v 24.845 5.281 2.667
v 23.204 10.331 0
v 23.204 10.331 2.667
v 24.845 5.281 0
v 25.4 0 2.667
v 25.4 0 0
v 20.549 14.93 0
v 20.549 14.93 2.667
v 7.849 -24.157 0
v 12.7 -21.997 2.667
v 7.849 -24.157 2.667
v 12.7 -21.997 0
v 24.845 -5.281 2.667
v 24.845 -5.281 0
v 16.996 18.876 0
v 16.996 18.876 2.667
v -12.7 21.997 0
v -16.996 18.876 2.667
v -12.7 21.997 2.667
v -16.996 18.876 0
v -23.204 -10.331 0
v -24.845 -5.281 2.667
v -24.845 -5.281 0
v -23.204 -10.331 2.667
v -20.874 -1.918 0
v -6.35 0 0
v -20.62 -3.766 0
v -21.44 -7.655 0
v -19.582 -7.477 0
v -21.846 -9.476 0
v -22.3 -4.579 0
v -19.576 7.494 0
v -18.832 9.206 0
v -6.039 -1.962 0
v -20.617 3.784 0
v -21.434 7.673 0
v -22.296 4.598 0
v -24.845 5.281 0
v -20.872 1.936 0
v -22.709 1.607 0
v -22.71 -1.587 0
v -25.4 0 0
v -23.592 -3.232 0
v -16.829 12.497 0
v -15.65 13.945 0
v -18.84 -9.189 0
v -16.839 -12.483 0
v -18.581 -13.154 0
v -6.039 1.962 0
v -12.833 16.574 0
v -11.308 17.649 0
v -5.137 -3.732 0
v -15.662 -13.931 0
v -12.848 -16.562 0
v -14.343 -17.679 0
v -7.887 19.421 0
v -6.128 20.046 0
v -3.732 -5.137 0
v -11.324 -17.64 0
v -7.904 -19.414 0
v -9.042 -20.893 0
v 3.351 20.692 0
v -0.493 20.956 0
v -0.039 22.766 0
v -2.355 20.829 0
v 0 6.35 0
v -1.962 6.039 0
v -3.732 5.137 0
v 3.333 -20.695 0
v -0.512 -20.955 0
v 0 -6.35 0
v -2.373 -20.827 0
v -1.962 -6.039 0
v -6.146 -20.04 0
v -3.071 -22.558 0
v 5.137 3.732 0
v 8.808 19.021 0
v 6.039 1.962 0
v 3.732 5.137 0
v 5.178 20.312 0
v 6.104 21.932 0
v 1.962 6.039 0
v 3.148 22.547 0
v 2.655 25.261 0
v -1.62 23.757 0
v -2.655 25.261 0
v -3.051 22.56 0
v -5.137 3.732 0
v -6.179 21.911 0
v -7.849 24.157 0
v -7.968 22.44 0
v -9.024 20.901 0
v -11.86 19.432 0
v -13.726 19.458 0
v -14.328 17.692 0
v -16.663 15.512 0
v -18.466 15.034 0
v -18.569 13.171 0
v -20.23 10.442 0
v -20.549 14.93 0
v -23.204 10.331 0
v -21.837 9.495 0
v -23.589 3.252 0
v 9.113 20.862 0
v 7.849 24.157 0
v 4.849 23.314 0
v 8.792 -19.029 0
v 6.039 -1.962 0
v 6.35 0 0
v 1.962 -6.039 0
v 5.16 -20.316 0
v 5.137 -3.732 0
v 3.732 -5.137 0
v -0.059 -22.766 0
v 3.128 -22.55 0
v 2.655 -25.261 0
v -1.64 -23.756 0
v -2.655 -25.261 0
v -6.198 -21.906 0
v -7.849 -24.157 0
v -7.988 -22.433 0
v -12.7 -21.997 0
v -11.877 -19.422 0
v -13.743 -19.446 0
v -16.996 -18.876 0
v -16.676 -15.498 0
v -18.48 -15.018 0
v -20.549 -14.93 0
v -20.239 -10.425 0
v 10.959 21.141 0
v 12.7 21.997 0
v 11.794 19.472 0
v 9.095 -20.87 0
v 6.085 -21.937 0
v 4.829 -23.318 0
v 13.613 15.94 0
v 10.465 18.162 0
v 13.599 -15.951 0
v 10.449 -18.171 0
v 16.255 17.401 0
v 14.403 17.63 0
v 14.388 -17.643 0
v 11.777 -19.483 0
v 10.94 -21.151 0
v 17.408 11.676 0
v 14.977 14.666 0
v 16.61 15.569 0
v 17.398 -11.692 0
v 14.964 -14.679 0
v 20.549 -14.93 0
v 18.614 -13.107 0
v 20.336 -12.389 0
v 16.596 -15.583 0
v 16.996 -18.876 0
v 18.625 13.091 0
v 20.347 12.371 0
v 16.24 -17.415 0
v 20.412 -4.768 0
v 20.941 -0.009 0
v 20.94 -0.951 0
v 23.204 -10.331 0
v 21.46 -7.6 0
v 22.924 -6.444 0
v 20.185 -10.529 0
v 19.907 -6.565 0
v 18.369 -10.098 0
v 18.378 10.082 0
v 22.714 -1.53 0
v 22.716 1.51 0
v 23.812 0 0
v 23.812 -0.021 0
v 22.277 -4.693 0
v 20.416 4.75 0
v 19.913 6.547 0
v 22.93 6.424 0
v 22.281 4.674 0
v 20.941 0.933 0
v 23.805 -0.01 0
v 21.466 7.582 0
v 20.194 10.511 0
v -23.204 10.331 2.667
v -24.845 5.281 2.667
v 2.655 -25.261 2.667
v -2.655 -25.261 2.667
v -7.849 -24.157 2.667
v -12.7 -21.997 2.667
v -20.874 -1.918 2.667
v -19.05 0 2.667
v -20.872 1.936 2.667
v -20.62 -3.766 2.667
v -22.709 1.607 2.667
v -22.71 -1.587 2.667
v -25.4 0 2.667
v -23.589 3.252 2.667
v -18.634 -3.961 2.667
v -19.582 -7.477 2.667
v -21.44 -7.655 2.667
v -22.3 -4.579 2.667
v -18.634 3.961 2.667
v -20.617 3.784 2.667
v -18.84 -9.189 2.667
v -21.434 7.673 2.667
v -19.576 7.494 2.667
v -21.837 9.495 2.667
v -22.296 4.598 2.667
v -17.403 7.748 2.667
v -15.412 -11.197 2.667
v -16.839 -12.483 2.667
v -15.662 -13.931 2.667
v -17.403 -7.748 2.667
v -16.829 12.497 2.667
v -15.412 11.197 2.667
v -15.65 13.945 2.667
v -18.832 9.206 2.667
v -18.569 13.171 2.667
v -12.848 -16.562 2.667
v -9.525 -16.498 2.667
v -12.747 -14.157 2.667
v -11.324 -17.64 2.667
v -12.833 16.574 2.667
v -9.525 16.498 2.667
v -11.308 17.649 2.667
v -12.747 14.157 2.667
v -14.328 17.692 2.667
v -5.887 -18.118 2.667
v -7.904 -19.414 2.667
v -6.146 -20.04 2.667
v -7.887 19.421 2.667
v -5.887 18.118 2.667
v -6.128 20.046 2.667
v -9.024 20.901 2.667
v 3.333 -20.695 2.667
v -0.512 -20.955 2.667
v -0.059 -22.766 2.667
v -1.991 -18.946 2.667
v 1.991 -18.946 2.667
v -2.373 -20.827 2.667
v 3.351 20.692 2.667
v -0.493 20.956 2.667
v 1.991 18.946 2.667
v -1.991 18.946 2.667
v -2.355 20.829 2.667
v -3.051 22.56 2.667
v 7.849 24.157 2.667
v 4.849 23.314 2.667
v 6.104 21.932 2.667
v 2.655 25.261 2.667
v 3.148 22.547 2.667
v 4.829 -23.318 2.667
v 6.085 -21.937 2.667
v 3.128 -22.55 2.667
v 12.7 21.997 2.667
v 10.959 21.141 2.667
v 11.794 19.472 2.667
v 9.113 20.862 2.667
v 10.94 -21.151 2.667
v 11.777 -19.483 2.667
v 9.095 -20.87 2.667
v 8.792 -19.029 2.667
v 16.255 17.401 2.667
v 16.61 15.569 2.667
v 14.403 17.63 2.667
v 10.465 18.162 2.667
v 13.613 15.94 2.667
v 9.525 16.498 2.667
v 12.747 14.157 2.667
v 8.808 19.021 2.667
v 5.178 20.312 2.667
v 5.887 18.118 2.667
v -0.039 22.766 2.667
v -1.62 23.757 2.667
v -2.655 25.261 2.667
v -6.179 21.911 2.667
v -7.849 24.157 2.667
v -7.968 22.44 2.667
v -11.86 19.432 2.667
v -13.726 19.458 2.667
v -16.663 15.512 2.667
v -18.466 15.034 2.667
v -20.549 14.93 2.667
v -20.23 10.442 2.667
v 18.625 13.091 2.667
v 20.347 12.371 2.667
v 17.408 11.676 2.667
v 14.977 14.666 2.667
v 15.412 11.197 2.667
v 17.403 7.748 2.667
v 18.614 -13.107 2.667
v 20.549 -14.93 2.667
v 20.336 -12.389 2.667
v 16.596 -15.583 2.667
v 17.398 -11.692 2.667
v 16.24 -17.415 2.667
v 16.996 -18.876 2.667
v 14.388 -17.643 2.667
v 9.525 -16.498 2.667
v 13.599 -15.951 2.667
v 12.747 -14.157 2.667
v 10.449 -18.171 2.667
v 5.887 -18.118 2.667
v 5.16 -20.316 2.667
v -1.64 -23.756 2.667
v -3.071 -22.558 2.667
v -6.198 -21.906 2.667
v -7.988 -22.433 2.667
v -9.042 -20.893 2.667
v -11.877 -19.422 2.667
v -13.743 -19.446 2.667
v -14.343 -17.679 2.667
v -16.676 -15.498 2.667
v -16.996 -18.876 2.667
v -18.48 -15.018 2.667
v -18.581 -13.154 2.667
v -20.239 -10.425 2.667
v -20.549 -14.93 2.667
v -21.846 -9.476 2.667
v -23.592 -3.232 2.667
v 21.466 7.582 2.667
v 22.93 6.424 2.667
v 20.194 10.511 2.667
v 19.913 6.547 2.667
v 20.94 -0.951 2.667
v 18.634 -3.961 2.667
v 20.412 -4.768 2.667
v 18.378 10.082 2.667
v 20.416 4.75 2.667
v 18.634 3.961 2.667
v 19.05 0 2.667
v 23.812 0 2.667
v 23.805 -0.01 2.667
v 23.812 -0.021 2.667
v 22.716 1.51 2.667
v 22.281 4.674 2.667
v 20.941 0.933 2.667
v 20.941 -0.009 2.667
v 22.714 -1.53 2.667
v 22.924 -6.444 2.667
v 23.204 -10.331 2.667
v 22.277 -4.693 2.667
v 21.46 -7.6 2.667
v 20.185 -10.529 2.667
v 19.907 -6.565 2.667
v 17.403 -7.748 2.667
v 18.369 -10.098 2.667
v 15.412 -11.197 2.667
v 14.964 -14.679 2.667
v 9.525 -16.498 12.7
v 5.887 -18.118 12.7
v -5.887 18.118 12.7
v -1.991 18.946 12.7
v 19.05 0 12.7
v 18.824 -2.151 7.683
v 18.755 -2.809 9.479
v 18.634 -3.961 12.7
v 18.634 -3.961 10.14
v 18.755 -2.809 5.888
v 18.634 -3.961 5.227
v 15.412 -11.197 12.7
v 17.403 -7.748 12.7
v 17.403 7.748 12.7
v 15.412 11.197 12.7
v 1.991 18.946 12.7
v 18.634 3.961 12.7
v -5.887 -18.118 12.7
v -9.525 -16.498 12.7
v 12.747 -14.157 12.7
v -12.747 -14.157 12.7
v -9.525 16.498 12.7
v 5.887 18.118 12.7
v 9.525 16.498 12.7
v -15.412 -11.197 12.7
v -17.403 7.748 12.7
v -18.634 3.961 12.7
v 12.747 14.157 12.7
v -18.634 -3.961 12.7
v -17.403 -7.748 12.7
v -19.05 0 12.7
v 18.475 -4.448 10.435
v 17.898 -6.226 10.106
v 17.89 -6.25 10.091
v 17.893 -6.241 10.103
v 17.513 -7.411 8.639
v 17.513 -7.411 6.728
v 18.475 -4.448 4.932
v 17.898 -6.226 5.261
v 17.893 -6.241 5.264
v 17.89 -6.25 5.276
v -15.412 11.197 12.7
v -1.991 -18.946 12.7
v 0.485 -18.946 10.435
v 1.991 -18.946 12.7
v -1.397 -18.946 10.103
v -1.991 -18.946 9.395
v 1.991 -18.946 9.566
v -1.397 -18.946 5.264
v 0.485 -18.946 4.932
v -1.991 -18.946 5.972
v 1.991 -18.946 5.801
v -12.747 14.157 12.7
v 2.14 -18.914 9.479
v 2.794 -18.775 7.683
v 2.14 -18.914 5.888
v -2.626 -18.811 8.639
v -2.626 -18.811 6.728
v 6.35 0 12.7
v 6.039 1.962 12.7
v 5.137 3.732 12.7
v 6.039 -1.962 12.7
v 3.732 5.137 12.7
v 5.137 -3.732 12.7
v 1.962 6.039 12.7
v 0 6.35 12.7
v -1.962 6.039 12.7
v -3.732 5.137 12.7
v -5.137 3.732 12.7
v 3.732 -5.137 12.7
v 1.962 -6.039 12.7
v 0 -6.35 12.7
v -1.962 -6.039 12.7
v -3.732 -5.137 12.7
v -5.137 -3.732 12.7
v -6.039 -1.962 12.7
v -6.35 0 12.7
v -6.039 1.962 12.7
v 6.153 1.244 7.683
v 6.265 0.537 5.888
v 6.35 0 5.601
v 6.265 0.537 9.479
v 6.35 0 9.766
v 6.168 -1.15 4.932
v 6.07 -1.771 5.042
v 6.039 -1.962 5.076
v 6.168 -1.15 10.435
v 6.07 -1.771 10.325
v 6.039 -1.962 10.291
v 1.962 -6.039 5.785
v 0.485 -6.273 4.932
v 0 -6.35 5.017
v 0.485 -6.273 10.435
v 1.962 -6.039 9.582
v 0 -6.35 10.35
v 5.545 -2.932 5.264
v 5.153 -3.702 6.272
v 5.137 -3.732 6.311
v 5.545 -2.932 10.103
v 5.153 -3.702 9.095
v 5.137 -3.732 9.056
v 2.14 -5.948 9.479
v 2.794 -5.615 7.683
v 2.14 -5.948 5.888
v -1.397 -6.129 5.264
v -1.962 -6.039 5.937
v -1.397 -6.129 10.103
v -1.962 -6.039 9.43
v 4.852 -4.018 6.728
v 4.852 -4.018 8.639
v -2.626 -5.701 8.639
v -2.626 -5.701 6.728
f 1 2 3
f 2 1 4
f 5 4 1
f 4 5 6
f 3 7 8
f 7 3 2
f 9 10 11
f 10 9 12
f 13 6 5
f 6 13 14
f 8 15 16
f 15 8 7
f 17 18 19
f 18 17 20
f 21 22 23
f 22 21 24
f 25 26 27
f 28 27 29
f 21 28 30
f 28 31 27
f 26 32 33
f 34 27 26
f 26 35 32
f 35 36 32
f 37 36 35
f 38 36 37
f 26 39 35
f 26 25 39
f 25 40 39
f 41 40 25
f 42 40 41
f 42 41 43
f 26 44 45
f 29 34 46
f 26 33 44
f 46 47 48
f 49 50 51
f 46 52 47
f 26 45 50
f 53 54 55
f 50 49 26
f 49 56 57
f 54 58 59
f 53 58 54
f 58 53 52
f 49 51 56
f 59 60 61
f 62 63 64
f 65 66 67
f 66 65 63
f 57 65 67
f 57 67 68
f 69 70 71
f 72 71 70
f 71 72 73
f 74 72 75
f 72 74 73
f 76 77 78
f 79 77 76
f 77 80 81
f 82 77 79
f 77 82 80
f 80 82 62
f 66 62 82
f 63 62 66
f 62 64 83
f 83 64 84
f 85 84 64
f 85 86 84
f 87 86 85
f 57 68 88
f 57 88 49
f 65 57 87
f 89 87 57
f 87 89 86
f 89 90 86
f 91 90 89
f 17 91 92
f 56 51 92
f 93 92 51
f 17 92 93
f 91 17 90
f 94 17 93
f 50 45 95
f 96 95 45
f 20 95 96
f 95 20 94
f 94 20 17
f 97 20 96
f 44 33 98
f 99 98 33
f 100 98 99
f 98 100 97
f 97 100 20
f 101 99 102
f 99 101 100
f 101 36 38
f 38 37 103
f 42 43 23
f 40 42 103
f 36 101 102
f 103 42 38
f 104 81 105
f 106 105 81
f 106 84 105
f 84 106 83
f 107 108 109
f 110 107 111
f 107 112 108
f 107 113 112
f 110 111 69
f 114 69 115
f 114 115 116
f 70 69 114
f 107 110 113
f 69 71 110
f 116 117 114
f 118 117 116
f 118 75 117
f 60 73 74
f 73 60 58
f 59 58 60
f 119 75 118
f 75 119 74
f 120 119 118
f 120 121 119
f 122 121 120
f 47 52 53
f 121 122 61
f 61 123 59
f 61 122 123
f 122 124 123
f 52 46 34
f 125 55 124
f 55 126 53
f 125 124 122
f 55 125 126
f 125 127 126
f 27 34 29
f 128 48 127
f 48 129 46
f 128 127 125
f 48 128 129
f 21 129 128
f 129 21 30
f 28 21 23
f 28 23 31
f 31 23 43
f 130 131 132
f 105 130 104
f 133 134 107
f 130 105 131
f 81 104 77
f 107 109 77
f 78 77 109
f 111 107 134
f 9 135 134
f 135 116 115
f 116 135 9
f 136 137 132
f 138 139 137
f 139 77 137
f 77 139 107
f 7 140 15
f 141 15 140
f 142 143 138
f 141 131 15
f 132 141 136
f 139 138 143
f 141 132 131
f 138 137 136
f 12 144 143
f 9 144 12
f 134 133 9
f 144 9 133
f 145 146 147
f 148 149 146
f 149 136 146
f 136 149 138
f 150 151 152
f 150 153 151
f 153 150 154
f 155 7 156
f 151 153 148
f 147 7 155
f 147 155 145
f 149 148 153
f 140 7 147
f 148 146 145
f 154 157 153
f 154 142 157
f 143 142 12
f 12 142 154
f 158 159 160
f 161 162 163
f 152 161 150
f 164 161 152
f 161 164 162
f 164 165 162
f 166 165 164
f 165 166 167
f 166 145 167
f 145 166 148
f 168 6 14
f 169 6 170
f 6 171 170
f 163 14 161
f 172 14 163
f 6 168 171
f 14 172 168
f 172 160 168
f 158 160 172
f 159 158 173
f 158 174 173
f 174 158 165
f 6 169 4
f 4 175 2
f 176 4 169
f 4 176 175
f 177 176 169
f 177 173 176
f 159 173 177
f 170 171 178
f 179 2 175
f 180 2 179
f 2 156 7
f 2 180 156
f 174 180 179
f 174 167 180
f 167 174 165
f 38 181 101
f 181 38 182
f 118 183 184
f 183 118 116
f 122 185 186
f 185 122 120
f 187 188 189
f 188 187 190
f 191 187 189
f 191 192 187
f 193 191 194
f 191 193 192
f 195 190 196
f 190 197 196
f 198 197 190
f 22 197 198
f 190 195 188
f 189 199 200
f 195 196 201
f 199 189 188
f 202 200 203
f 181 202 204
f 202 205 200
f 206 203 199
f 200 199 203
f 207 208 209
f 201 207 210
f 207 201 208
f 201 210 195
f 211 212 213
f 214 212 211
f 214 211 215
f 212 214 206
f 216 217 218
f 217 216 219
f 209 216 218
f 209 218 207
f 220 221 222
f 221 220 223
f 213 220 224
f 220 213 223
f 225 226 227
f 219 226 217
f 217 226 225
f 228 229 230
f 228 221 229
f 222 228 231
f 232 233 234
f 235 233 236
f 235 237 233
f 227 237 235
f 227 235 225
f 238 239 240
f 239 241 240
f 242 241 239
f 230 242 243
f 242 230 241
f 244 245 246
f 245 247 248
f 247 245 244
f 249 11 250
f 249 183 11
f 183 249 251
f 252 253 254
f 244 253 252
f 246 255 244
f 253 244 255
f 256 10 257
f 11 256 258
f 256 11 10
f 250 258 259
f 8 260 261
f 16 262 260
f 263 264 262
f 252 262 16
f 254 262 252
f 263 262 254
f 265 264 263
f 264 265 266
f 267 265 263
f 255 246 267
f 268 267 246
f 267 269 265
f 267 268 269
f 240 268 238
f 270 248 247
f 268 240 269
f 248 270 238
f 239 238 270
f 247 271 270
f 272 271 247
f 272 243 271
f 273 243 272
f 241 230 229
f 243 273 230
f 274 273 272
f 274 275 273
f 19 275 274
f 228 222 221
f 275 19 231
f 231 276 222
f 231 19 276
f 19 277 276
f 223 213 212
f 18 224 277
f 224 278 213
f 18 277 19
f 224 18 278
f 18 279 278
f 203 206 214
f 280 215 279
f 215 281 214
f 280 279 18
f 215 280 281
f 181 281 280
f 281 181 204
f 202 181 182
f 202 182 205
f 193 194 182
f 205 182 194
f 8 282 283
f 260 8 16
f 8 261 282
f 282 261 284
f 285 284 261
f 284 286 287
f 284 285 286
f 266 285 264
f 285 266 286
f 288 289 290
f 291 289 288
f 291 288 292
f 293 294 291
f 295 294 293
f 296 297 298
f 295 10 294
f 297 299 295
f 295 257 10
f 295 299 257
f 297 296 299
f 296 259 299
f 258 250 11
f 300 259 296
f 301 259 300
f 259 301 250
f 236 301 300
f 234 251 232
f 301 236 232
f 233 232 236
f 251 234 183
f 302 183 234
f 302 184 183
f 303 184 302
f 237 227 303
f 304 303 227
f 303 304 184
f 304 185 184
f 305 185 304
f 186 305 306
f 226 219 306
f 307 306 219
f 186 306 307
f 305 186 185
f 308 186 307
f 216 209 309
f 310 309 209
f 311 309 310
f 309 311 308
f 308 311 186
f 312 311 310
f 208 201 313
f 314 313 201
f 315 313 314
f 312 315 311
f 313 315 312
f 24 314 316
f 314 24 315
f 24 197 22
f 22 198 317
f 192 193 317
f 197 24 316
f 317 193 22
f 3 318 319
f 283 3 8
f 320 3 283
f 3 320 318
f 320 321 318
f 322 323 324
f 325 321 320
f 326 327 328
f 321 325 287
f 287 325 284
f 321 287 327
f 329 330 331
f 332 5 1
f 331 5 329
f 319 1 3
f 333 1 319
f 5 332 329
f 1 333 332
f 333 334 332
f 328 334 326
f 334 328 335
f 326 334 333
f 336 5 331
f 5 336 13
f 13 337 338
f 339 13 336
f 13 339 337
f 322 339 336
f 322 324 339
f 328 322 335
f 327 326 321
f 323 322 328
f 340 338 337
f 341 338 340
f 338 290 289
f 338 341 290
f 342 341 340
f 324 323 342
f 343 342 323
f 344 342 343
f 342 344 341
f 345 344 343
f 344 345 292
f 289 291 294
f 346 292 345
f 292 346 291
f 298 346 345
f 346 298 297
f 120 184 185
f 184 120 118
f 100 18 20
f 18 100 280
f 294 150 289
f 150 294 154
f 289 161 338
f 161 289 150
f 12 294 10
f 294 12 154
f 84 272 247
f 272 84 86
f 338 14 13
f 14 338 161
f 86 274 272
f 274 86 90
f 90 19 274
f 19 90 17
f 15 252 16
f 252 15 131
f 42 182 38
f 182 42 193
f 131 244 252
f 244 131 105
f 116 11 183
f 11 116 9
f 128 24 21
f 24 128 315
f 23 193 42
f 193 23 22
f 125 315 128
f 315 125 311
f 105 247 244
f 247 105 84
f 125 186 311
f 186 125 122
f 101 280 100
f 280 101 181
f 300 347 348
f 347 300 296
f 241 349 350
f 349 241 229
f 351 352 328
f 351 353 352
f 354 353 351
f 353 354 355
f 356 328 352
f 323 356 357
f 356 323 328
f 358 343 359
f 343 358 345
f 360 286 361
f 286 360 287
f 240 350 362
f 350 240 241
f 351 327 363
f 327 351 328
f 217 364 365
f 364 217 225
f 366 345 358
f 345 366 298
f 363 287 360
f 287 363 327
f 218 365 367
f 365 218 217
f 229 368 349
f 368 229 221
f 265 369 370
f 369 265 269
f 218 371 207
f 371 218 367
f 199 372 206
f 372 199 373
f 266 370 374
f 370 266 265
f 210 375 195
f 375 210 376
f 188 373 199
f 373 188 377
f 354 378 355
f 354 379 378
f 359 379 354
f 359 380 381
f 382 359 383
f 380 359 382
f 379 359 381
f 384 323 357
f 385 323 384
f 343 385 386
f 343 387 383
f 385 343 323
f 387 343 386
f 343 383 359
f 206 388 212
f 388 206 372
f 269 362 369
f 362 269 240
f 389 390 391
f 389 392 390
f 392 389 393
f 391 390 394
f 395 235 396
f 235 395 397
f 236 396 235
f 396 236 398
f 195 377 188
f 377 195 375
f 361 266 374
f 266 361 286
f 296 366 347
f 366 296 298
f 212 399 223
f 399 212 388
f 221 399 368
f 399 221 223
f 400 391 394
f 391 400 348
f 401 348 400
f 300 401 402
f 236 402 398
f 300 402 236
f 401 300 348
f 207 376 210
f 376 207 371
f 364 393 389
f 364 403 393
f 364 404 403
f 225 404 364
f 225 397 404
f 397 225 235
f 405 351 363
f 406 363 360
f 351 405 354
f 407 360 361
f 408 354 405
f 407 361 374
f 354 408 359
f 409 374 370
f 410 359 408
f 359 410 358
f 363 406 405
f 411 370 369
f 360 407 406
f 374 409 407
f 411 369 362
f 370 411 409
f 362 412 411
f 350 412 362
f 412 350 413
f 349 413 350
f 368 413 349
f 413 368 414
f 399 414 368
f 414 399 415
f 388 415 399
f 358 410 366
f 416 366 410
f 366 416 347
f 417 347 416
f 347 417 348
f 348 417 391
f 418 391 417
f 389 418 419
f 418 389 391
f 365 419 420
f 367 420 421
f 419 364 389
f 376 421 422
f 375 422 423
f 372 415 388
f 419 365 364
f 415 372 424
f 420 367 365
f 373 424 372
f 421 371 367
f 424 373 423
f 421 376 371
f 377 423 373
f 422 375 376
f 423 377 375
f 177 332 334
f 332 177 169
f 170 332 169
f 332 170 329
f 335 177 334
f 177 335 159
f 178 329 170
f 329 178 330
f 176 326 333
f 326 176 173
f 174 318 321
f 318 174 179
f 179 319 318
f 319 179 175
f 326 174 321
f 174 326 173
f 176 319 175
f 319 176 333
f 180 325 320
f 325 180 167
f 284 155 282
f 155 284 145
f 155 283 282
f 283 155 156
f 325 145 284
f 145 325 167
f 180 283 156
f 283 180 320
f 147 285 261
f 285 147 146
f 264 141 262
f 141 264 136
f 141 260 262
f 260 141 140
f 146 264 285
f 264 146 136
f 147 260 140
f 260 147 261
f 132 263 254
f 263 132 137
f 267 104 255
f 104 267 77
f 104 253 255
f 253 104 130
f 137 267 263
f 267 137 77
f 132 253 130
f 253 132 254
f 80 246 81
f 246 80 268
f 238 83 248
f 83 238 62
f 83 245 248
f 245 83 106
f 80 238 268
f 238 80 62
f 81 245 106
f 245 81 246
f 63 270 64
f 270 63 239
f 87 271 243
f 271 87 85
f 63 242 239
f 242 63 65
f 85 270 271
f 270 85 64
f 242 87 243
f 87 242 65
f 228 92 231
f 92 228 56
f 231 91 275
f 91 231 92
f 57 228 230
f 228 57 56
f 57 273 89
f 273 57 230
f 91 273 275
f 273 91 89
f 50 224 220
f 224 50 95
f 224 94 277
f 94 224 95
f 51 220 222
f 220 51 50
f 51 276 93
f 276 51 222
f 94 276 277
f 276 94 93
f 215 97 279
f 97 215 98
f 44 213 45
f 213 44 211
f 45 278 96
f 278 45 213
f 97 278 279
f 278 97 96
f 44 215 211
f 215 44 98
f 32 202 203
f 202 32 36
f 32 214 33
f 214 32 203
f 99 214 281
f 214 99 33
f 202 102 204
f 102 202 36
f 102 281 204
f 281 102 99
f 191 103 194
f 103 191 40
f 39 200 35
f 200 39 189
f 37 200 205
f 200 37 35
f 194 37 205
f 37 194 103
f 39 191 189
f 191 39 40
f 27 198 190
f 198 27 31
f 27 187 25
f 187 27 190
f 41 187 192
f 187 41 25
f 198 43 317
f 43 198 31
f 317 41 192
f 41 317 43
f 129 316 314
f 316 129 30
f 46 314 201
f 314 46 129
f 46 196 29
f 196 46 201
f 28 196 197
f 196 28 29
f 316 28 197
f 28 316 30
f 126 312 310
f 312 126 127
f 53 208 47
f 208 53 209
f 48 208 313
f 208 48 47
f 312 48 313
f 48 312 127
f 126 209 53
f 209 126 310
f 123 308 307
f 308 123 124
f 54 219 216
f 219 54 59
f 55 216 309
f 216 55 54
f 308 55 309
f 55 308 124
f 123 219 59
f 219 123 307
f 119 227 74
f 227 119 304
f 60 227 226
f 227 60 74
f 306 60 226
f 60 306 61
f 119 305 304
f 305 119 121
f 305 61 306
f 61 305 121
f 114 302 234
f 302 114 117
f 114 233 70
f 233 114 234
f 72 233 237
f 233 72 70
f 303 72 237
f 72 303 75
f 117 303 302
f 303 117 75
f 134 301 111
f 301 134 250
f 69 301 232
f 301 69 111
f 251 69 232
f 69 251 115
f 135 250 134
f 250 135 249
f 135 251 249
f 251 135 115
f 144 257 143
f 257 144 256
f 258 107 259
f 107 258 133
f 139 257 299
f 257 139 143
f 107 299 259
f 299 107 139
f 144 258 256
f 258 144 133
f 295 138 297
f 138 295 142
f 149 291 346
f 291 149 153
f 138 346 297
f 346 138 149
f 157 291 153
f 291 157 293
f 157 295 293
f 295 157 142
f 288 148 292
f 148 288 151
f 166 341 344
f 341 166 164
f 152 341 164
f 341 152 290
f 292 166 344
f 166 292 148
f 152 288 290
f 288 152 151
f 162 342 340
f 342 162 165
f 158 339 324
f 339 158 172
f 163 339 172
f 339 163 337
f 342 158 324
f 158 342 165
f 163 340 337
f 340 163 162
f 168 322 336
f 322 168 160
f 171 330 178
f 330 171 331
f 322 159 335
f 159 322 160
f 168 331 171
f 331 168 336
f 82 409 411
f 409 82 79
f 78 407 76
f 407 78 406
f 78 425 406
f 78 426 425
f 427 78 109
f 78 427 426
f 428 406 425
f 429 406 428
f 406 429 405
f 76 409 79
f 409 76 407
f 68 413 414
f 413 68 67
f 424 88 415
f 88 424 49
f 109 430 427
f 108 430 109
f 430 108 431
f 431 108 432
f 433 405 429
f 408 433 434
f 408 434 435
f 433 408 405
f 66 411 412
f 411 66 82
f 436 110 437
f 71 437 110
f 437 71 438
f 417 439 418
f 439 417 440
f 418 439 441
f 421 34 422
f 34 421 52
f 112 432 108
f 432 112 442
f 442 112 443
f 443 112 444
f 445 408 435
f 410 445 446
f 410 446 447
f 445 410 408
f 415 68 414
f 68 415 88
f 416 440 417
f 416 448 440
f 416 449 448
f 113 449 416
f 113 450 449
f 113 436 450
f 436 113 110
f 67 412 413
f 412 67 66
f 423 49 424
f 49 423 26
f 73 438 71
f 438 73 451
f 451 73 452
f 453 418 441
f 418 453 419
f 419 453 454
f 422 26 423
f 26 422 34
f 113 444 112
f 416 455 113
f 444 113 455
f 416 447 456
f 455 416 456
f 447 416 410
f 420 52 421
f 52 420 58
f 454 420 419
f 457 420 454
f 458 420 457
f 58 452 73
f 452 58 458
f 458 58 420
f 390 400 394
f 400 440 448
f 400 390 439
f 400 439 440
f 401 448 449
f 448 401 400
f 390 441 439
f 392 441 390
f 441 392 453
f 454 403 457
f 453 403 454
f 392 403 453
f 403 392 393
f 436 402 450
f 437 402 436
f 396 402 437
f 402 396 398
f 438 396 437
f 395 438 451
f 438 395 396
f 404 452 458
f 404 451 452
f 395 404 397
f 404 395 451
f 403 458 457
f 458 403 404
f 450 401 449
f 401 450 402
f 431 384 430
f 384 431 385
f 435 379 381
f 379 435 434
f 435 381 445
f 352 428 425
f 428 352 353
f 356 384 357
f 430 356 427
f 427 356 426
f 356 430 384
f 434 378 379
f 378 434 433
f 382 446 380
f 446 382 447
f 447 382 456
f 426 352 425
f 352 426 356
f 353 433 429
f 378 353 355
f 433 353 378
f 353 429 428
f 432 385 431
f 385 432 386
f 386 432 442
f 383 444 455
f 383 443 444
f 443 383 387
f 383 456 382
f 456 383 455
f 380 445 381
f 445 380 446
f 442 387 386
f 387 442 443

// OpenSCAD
function mm(i) = i*25.4 ;
thickness = mm(.5);
width = mm(1.5);
toothAngle = 15.65;



module base()
{
	union()
	{
		cylinder(mm(.105),mm(2)/2, mm(2)/2, 0);
		cylinder(thickness,width/2,width/2,0);
		
	}
		
}


module centerHole()
{
	cylinder(mm(thickness+mm(1)),mm(.5)/2, mm(.5)/2, 0);
}


module sideHole()
{
		{rotate([90, 0, 0]) {
		cylinder(mm(.75),mm(.22)/2,mm(.22)/2,0);
		}
	}
}


module triangle()
{
	difference(){
			translate([mm(7.4/8),0,0]) {
			rotate([0,0,90]){
				polyhedron( 
      	   	points = [ 
             	[-3, -2, 4], 
              	[3, -2, 4], 
              	[0, 3, 4], 
              	[-3, -2, -1], 
              	[3, -2, -1], 
              	[0, 3, -1]
        		 ],
        		 triangles = [
             	 [0, 1, 2],
             	 [3, 4, 5],
              	[0, 1, 4, 3],
              	[0, 2, 5, 3],
              	[1, 2, 5, 4]
        	 ]
   	 );
			}					
		}
		translate([mm(.62),mm(-.25/2),-mm(.1)]) {
  				cube([mm(.25),mm(.25),mm(.105+.2)]);
		}
	}	
}


module toothgap()

{
union(){
	translate([mm(7/8),0,-1])	{
		cylinder(mm(.2),mm(1/8)/2,mm(1/8)/2,0);
		}	
	triangle();
	}
}

module teeth()
{
	union(){
		toothgap();
		rotate([0, 0, toothAngle]) {
			toothgap();
		}
		rotate([0, 0, toothAngle*2]) {
			toothgap();
		}
	rotate([0, 0, toothAngle*3]) {
			toothgap();
		}
	rotate([0, 0, toothAngle*4]) {
			toothgap();
		}
	rotate([0, 0, toothAngle*5]) {
			toothgap();
		}
	rotate([0, 0, toothAngle*6]) {
			toothgap();
		}
	rotate([0, 0, toothAngle*7]) {
			toothgap();
		}
	rotate([0, 0, toothAngle*8]) {
			toothgap();
		}
	rotate([0, 0, toothAngle*9]) {
			toothgap();
		}
	rotate([0, 0, toothAngle*10]) {
			toothgap();
		}
	rotate([0, 0, toothAngle*11]) {
			toothgap();
		}
	rotate([0, 0, toothAngle*12]) {
			toothgap();
		}
	rotate([0, 0, toothAngle*13]) {
			toothgap();
		}
	rotate([0, 0, toothAngle*14]) {
			toothgap();
		}
	rotate([0, 0, toothAngle*15]) {
			toothgap();
		}
	rotate([0, 0, toothAngle*16]) {
			toothgap();
		}
	rotate([0, 0, toothAngle*17]) {
			toothgap();
		}
	rotate([0, 0, toothAngle*18]) {
			toothgap();
		}
	rotate([0, 0, toothAngle*19]) {
			toothgap();
		}
	rotate([0, 0, toothAngle*20]) {
			toothgap();
		}
	rotate([0, 0, toothAngle*21]) {
			toothgap();
		}
	rotate([0, 0, toothAngle*22]) {
			toothgap();
		}
	rotate([0, 0, toothAngle*23]) {
			toothgap();
		}
	}
}


module sprocket()
{
	difference(){
		base();
			translate([0,0,mm(-.5)]) {
			centerHole();
			}
		translate([0,0,(thickness/2+mm(.105)/2)]) {
			sideHole();
			}
		{rotate([0, 0, 75]) {
		translate([0,0,(thickness/2+mm(.105)/2)]) {
			sideHole();
				}
			}
		teeth();
		}
	}
}


sprocket();
//toothgap();
